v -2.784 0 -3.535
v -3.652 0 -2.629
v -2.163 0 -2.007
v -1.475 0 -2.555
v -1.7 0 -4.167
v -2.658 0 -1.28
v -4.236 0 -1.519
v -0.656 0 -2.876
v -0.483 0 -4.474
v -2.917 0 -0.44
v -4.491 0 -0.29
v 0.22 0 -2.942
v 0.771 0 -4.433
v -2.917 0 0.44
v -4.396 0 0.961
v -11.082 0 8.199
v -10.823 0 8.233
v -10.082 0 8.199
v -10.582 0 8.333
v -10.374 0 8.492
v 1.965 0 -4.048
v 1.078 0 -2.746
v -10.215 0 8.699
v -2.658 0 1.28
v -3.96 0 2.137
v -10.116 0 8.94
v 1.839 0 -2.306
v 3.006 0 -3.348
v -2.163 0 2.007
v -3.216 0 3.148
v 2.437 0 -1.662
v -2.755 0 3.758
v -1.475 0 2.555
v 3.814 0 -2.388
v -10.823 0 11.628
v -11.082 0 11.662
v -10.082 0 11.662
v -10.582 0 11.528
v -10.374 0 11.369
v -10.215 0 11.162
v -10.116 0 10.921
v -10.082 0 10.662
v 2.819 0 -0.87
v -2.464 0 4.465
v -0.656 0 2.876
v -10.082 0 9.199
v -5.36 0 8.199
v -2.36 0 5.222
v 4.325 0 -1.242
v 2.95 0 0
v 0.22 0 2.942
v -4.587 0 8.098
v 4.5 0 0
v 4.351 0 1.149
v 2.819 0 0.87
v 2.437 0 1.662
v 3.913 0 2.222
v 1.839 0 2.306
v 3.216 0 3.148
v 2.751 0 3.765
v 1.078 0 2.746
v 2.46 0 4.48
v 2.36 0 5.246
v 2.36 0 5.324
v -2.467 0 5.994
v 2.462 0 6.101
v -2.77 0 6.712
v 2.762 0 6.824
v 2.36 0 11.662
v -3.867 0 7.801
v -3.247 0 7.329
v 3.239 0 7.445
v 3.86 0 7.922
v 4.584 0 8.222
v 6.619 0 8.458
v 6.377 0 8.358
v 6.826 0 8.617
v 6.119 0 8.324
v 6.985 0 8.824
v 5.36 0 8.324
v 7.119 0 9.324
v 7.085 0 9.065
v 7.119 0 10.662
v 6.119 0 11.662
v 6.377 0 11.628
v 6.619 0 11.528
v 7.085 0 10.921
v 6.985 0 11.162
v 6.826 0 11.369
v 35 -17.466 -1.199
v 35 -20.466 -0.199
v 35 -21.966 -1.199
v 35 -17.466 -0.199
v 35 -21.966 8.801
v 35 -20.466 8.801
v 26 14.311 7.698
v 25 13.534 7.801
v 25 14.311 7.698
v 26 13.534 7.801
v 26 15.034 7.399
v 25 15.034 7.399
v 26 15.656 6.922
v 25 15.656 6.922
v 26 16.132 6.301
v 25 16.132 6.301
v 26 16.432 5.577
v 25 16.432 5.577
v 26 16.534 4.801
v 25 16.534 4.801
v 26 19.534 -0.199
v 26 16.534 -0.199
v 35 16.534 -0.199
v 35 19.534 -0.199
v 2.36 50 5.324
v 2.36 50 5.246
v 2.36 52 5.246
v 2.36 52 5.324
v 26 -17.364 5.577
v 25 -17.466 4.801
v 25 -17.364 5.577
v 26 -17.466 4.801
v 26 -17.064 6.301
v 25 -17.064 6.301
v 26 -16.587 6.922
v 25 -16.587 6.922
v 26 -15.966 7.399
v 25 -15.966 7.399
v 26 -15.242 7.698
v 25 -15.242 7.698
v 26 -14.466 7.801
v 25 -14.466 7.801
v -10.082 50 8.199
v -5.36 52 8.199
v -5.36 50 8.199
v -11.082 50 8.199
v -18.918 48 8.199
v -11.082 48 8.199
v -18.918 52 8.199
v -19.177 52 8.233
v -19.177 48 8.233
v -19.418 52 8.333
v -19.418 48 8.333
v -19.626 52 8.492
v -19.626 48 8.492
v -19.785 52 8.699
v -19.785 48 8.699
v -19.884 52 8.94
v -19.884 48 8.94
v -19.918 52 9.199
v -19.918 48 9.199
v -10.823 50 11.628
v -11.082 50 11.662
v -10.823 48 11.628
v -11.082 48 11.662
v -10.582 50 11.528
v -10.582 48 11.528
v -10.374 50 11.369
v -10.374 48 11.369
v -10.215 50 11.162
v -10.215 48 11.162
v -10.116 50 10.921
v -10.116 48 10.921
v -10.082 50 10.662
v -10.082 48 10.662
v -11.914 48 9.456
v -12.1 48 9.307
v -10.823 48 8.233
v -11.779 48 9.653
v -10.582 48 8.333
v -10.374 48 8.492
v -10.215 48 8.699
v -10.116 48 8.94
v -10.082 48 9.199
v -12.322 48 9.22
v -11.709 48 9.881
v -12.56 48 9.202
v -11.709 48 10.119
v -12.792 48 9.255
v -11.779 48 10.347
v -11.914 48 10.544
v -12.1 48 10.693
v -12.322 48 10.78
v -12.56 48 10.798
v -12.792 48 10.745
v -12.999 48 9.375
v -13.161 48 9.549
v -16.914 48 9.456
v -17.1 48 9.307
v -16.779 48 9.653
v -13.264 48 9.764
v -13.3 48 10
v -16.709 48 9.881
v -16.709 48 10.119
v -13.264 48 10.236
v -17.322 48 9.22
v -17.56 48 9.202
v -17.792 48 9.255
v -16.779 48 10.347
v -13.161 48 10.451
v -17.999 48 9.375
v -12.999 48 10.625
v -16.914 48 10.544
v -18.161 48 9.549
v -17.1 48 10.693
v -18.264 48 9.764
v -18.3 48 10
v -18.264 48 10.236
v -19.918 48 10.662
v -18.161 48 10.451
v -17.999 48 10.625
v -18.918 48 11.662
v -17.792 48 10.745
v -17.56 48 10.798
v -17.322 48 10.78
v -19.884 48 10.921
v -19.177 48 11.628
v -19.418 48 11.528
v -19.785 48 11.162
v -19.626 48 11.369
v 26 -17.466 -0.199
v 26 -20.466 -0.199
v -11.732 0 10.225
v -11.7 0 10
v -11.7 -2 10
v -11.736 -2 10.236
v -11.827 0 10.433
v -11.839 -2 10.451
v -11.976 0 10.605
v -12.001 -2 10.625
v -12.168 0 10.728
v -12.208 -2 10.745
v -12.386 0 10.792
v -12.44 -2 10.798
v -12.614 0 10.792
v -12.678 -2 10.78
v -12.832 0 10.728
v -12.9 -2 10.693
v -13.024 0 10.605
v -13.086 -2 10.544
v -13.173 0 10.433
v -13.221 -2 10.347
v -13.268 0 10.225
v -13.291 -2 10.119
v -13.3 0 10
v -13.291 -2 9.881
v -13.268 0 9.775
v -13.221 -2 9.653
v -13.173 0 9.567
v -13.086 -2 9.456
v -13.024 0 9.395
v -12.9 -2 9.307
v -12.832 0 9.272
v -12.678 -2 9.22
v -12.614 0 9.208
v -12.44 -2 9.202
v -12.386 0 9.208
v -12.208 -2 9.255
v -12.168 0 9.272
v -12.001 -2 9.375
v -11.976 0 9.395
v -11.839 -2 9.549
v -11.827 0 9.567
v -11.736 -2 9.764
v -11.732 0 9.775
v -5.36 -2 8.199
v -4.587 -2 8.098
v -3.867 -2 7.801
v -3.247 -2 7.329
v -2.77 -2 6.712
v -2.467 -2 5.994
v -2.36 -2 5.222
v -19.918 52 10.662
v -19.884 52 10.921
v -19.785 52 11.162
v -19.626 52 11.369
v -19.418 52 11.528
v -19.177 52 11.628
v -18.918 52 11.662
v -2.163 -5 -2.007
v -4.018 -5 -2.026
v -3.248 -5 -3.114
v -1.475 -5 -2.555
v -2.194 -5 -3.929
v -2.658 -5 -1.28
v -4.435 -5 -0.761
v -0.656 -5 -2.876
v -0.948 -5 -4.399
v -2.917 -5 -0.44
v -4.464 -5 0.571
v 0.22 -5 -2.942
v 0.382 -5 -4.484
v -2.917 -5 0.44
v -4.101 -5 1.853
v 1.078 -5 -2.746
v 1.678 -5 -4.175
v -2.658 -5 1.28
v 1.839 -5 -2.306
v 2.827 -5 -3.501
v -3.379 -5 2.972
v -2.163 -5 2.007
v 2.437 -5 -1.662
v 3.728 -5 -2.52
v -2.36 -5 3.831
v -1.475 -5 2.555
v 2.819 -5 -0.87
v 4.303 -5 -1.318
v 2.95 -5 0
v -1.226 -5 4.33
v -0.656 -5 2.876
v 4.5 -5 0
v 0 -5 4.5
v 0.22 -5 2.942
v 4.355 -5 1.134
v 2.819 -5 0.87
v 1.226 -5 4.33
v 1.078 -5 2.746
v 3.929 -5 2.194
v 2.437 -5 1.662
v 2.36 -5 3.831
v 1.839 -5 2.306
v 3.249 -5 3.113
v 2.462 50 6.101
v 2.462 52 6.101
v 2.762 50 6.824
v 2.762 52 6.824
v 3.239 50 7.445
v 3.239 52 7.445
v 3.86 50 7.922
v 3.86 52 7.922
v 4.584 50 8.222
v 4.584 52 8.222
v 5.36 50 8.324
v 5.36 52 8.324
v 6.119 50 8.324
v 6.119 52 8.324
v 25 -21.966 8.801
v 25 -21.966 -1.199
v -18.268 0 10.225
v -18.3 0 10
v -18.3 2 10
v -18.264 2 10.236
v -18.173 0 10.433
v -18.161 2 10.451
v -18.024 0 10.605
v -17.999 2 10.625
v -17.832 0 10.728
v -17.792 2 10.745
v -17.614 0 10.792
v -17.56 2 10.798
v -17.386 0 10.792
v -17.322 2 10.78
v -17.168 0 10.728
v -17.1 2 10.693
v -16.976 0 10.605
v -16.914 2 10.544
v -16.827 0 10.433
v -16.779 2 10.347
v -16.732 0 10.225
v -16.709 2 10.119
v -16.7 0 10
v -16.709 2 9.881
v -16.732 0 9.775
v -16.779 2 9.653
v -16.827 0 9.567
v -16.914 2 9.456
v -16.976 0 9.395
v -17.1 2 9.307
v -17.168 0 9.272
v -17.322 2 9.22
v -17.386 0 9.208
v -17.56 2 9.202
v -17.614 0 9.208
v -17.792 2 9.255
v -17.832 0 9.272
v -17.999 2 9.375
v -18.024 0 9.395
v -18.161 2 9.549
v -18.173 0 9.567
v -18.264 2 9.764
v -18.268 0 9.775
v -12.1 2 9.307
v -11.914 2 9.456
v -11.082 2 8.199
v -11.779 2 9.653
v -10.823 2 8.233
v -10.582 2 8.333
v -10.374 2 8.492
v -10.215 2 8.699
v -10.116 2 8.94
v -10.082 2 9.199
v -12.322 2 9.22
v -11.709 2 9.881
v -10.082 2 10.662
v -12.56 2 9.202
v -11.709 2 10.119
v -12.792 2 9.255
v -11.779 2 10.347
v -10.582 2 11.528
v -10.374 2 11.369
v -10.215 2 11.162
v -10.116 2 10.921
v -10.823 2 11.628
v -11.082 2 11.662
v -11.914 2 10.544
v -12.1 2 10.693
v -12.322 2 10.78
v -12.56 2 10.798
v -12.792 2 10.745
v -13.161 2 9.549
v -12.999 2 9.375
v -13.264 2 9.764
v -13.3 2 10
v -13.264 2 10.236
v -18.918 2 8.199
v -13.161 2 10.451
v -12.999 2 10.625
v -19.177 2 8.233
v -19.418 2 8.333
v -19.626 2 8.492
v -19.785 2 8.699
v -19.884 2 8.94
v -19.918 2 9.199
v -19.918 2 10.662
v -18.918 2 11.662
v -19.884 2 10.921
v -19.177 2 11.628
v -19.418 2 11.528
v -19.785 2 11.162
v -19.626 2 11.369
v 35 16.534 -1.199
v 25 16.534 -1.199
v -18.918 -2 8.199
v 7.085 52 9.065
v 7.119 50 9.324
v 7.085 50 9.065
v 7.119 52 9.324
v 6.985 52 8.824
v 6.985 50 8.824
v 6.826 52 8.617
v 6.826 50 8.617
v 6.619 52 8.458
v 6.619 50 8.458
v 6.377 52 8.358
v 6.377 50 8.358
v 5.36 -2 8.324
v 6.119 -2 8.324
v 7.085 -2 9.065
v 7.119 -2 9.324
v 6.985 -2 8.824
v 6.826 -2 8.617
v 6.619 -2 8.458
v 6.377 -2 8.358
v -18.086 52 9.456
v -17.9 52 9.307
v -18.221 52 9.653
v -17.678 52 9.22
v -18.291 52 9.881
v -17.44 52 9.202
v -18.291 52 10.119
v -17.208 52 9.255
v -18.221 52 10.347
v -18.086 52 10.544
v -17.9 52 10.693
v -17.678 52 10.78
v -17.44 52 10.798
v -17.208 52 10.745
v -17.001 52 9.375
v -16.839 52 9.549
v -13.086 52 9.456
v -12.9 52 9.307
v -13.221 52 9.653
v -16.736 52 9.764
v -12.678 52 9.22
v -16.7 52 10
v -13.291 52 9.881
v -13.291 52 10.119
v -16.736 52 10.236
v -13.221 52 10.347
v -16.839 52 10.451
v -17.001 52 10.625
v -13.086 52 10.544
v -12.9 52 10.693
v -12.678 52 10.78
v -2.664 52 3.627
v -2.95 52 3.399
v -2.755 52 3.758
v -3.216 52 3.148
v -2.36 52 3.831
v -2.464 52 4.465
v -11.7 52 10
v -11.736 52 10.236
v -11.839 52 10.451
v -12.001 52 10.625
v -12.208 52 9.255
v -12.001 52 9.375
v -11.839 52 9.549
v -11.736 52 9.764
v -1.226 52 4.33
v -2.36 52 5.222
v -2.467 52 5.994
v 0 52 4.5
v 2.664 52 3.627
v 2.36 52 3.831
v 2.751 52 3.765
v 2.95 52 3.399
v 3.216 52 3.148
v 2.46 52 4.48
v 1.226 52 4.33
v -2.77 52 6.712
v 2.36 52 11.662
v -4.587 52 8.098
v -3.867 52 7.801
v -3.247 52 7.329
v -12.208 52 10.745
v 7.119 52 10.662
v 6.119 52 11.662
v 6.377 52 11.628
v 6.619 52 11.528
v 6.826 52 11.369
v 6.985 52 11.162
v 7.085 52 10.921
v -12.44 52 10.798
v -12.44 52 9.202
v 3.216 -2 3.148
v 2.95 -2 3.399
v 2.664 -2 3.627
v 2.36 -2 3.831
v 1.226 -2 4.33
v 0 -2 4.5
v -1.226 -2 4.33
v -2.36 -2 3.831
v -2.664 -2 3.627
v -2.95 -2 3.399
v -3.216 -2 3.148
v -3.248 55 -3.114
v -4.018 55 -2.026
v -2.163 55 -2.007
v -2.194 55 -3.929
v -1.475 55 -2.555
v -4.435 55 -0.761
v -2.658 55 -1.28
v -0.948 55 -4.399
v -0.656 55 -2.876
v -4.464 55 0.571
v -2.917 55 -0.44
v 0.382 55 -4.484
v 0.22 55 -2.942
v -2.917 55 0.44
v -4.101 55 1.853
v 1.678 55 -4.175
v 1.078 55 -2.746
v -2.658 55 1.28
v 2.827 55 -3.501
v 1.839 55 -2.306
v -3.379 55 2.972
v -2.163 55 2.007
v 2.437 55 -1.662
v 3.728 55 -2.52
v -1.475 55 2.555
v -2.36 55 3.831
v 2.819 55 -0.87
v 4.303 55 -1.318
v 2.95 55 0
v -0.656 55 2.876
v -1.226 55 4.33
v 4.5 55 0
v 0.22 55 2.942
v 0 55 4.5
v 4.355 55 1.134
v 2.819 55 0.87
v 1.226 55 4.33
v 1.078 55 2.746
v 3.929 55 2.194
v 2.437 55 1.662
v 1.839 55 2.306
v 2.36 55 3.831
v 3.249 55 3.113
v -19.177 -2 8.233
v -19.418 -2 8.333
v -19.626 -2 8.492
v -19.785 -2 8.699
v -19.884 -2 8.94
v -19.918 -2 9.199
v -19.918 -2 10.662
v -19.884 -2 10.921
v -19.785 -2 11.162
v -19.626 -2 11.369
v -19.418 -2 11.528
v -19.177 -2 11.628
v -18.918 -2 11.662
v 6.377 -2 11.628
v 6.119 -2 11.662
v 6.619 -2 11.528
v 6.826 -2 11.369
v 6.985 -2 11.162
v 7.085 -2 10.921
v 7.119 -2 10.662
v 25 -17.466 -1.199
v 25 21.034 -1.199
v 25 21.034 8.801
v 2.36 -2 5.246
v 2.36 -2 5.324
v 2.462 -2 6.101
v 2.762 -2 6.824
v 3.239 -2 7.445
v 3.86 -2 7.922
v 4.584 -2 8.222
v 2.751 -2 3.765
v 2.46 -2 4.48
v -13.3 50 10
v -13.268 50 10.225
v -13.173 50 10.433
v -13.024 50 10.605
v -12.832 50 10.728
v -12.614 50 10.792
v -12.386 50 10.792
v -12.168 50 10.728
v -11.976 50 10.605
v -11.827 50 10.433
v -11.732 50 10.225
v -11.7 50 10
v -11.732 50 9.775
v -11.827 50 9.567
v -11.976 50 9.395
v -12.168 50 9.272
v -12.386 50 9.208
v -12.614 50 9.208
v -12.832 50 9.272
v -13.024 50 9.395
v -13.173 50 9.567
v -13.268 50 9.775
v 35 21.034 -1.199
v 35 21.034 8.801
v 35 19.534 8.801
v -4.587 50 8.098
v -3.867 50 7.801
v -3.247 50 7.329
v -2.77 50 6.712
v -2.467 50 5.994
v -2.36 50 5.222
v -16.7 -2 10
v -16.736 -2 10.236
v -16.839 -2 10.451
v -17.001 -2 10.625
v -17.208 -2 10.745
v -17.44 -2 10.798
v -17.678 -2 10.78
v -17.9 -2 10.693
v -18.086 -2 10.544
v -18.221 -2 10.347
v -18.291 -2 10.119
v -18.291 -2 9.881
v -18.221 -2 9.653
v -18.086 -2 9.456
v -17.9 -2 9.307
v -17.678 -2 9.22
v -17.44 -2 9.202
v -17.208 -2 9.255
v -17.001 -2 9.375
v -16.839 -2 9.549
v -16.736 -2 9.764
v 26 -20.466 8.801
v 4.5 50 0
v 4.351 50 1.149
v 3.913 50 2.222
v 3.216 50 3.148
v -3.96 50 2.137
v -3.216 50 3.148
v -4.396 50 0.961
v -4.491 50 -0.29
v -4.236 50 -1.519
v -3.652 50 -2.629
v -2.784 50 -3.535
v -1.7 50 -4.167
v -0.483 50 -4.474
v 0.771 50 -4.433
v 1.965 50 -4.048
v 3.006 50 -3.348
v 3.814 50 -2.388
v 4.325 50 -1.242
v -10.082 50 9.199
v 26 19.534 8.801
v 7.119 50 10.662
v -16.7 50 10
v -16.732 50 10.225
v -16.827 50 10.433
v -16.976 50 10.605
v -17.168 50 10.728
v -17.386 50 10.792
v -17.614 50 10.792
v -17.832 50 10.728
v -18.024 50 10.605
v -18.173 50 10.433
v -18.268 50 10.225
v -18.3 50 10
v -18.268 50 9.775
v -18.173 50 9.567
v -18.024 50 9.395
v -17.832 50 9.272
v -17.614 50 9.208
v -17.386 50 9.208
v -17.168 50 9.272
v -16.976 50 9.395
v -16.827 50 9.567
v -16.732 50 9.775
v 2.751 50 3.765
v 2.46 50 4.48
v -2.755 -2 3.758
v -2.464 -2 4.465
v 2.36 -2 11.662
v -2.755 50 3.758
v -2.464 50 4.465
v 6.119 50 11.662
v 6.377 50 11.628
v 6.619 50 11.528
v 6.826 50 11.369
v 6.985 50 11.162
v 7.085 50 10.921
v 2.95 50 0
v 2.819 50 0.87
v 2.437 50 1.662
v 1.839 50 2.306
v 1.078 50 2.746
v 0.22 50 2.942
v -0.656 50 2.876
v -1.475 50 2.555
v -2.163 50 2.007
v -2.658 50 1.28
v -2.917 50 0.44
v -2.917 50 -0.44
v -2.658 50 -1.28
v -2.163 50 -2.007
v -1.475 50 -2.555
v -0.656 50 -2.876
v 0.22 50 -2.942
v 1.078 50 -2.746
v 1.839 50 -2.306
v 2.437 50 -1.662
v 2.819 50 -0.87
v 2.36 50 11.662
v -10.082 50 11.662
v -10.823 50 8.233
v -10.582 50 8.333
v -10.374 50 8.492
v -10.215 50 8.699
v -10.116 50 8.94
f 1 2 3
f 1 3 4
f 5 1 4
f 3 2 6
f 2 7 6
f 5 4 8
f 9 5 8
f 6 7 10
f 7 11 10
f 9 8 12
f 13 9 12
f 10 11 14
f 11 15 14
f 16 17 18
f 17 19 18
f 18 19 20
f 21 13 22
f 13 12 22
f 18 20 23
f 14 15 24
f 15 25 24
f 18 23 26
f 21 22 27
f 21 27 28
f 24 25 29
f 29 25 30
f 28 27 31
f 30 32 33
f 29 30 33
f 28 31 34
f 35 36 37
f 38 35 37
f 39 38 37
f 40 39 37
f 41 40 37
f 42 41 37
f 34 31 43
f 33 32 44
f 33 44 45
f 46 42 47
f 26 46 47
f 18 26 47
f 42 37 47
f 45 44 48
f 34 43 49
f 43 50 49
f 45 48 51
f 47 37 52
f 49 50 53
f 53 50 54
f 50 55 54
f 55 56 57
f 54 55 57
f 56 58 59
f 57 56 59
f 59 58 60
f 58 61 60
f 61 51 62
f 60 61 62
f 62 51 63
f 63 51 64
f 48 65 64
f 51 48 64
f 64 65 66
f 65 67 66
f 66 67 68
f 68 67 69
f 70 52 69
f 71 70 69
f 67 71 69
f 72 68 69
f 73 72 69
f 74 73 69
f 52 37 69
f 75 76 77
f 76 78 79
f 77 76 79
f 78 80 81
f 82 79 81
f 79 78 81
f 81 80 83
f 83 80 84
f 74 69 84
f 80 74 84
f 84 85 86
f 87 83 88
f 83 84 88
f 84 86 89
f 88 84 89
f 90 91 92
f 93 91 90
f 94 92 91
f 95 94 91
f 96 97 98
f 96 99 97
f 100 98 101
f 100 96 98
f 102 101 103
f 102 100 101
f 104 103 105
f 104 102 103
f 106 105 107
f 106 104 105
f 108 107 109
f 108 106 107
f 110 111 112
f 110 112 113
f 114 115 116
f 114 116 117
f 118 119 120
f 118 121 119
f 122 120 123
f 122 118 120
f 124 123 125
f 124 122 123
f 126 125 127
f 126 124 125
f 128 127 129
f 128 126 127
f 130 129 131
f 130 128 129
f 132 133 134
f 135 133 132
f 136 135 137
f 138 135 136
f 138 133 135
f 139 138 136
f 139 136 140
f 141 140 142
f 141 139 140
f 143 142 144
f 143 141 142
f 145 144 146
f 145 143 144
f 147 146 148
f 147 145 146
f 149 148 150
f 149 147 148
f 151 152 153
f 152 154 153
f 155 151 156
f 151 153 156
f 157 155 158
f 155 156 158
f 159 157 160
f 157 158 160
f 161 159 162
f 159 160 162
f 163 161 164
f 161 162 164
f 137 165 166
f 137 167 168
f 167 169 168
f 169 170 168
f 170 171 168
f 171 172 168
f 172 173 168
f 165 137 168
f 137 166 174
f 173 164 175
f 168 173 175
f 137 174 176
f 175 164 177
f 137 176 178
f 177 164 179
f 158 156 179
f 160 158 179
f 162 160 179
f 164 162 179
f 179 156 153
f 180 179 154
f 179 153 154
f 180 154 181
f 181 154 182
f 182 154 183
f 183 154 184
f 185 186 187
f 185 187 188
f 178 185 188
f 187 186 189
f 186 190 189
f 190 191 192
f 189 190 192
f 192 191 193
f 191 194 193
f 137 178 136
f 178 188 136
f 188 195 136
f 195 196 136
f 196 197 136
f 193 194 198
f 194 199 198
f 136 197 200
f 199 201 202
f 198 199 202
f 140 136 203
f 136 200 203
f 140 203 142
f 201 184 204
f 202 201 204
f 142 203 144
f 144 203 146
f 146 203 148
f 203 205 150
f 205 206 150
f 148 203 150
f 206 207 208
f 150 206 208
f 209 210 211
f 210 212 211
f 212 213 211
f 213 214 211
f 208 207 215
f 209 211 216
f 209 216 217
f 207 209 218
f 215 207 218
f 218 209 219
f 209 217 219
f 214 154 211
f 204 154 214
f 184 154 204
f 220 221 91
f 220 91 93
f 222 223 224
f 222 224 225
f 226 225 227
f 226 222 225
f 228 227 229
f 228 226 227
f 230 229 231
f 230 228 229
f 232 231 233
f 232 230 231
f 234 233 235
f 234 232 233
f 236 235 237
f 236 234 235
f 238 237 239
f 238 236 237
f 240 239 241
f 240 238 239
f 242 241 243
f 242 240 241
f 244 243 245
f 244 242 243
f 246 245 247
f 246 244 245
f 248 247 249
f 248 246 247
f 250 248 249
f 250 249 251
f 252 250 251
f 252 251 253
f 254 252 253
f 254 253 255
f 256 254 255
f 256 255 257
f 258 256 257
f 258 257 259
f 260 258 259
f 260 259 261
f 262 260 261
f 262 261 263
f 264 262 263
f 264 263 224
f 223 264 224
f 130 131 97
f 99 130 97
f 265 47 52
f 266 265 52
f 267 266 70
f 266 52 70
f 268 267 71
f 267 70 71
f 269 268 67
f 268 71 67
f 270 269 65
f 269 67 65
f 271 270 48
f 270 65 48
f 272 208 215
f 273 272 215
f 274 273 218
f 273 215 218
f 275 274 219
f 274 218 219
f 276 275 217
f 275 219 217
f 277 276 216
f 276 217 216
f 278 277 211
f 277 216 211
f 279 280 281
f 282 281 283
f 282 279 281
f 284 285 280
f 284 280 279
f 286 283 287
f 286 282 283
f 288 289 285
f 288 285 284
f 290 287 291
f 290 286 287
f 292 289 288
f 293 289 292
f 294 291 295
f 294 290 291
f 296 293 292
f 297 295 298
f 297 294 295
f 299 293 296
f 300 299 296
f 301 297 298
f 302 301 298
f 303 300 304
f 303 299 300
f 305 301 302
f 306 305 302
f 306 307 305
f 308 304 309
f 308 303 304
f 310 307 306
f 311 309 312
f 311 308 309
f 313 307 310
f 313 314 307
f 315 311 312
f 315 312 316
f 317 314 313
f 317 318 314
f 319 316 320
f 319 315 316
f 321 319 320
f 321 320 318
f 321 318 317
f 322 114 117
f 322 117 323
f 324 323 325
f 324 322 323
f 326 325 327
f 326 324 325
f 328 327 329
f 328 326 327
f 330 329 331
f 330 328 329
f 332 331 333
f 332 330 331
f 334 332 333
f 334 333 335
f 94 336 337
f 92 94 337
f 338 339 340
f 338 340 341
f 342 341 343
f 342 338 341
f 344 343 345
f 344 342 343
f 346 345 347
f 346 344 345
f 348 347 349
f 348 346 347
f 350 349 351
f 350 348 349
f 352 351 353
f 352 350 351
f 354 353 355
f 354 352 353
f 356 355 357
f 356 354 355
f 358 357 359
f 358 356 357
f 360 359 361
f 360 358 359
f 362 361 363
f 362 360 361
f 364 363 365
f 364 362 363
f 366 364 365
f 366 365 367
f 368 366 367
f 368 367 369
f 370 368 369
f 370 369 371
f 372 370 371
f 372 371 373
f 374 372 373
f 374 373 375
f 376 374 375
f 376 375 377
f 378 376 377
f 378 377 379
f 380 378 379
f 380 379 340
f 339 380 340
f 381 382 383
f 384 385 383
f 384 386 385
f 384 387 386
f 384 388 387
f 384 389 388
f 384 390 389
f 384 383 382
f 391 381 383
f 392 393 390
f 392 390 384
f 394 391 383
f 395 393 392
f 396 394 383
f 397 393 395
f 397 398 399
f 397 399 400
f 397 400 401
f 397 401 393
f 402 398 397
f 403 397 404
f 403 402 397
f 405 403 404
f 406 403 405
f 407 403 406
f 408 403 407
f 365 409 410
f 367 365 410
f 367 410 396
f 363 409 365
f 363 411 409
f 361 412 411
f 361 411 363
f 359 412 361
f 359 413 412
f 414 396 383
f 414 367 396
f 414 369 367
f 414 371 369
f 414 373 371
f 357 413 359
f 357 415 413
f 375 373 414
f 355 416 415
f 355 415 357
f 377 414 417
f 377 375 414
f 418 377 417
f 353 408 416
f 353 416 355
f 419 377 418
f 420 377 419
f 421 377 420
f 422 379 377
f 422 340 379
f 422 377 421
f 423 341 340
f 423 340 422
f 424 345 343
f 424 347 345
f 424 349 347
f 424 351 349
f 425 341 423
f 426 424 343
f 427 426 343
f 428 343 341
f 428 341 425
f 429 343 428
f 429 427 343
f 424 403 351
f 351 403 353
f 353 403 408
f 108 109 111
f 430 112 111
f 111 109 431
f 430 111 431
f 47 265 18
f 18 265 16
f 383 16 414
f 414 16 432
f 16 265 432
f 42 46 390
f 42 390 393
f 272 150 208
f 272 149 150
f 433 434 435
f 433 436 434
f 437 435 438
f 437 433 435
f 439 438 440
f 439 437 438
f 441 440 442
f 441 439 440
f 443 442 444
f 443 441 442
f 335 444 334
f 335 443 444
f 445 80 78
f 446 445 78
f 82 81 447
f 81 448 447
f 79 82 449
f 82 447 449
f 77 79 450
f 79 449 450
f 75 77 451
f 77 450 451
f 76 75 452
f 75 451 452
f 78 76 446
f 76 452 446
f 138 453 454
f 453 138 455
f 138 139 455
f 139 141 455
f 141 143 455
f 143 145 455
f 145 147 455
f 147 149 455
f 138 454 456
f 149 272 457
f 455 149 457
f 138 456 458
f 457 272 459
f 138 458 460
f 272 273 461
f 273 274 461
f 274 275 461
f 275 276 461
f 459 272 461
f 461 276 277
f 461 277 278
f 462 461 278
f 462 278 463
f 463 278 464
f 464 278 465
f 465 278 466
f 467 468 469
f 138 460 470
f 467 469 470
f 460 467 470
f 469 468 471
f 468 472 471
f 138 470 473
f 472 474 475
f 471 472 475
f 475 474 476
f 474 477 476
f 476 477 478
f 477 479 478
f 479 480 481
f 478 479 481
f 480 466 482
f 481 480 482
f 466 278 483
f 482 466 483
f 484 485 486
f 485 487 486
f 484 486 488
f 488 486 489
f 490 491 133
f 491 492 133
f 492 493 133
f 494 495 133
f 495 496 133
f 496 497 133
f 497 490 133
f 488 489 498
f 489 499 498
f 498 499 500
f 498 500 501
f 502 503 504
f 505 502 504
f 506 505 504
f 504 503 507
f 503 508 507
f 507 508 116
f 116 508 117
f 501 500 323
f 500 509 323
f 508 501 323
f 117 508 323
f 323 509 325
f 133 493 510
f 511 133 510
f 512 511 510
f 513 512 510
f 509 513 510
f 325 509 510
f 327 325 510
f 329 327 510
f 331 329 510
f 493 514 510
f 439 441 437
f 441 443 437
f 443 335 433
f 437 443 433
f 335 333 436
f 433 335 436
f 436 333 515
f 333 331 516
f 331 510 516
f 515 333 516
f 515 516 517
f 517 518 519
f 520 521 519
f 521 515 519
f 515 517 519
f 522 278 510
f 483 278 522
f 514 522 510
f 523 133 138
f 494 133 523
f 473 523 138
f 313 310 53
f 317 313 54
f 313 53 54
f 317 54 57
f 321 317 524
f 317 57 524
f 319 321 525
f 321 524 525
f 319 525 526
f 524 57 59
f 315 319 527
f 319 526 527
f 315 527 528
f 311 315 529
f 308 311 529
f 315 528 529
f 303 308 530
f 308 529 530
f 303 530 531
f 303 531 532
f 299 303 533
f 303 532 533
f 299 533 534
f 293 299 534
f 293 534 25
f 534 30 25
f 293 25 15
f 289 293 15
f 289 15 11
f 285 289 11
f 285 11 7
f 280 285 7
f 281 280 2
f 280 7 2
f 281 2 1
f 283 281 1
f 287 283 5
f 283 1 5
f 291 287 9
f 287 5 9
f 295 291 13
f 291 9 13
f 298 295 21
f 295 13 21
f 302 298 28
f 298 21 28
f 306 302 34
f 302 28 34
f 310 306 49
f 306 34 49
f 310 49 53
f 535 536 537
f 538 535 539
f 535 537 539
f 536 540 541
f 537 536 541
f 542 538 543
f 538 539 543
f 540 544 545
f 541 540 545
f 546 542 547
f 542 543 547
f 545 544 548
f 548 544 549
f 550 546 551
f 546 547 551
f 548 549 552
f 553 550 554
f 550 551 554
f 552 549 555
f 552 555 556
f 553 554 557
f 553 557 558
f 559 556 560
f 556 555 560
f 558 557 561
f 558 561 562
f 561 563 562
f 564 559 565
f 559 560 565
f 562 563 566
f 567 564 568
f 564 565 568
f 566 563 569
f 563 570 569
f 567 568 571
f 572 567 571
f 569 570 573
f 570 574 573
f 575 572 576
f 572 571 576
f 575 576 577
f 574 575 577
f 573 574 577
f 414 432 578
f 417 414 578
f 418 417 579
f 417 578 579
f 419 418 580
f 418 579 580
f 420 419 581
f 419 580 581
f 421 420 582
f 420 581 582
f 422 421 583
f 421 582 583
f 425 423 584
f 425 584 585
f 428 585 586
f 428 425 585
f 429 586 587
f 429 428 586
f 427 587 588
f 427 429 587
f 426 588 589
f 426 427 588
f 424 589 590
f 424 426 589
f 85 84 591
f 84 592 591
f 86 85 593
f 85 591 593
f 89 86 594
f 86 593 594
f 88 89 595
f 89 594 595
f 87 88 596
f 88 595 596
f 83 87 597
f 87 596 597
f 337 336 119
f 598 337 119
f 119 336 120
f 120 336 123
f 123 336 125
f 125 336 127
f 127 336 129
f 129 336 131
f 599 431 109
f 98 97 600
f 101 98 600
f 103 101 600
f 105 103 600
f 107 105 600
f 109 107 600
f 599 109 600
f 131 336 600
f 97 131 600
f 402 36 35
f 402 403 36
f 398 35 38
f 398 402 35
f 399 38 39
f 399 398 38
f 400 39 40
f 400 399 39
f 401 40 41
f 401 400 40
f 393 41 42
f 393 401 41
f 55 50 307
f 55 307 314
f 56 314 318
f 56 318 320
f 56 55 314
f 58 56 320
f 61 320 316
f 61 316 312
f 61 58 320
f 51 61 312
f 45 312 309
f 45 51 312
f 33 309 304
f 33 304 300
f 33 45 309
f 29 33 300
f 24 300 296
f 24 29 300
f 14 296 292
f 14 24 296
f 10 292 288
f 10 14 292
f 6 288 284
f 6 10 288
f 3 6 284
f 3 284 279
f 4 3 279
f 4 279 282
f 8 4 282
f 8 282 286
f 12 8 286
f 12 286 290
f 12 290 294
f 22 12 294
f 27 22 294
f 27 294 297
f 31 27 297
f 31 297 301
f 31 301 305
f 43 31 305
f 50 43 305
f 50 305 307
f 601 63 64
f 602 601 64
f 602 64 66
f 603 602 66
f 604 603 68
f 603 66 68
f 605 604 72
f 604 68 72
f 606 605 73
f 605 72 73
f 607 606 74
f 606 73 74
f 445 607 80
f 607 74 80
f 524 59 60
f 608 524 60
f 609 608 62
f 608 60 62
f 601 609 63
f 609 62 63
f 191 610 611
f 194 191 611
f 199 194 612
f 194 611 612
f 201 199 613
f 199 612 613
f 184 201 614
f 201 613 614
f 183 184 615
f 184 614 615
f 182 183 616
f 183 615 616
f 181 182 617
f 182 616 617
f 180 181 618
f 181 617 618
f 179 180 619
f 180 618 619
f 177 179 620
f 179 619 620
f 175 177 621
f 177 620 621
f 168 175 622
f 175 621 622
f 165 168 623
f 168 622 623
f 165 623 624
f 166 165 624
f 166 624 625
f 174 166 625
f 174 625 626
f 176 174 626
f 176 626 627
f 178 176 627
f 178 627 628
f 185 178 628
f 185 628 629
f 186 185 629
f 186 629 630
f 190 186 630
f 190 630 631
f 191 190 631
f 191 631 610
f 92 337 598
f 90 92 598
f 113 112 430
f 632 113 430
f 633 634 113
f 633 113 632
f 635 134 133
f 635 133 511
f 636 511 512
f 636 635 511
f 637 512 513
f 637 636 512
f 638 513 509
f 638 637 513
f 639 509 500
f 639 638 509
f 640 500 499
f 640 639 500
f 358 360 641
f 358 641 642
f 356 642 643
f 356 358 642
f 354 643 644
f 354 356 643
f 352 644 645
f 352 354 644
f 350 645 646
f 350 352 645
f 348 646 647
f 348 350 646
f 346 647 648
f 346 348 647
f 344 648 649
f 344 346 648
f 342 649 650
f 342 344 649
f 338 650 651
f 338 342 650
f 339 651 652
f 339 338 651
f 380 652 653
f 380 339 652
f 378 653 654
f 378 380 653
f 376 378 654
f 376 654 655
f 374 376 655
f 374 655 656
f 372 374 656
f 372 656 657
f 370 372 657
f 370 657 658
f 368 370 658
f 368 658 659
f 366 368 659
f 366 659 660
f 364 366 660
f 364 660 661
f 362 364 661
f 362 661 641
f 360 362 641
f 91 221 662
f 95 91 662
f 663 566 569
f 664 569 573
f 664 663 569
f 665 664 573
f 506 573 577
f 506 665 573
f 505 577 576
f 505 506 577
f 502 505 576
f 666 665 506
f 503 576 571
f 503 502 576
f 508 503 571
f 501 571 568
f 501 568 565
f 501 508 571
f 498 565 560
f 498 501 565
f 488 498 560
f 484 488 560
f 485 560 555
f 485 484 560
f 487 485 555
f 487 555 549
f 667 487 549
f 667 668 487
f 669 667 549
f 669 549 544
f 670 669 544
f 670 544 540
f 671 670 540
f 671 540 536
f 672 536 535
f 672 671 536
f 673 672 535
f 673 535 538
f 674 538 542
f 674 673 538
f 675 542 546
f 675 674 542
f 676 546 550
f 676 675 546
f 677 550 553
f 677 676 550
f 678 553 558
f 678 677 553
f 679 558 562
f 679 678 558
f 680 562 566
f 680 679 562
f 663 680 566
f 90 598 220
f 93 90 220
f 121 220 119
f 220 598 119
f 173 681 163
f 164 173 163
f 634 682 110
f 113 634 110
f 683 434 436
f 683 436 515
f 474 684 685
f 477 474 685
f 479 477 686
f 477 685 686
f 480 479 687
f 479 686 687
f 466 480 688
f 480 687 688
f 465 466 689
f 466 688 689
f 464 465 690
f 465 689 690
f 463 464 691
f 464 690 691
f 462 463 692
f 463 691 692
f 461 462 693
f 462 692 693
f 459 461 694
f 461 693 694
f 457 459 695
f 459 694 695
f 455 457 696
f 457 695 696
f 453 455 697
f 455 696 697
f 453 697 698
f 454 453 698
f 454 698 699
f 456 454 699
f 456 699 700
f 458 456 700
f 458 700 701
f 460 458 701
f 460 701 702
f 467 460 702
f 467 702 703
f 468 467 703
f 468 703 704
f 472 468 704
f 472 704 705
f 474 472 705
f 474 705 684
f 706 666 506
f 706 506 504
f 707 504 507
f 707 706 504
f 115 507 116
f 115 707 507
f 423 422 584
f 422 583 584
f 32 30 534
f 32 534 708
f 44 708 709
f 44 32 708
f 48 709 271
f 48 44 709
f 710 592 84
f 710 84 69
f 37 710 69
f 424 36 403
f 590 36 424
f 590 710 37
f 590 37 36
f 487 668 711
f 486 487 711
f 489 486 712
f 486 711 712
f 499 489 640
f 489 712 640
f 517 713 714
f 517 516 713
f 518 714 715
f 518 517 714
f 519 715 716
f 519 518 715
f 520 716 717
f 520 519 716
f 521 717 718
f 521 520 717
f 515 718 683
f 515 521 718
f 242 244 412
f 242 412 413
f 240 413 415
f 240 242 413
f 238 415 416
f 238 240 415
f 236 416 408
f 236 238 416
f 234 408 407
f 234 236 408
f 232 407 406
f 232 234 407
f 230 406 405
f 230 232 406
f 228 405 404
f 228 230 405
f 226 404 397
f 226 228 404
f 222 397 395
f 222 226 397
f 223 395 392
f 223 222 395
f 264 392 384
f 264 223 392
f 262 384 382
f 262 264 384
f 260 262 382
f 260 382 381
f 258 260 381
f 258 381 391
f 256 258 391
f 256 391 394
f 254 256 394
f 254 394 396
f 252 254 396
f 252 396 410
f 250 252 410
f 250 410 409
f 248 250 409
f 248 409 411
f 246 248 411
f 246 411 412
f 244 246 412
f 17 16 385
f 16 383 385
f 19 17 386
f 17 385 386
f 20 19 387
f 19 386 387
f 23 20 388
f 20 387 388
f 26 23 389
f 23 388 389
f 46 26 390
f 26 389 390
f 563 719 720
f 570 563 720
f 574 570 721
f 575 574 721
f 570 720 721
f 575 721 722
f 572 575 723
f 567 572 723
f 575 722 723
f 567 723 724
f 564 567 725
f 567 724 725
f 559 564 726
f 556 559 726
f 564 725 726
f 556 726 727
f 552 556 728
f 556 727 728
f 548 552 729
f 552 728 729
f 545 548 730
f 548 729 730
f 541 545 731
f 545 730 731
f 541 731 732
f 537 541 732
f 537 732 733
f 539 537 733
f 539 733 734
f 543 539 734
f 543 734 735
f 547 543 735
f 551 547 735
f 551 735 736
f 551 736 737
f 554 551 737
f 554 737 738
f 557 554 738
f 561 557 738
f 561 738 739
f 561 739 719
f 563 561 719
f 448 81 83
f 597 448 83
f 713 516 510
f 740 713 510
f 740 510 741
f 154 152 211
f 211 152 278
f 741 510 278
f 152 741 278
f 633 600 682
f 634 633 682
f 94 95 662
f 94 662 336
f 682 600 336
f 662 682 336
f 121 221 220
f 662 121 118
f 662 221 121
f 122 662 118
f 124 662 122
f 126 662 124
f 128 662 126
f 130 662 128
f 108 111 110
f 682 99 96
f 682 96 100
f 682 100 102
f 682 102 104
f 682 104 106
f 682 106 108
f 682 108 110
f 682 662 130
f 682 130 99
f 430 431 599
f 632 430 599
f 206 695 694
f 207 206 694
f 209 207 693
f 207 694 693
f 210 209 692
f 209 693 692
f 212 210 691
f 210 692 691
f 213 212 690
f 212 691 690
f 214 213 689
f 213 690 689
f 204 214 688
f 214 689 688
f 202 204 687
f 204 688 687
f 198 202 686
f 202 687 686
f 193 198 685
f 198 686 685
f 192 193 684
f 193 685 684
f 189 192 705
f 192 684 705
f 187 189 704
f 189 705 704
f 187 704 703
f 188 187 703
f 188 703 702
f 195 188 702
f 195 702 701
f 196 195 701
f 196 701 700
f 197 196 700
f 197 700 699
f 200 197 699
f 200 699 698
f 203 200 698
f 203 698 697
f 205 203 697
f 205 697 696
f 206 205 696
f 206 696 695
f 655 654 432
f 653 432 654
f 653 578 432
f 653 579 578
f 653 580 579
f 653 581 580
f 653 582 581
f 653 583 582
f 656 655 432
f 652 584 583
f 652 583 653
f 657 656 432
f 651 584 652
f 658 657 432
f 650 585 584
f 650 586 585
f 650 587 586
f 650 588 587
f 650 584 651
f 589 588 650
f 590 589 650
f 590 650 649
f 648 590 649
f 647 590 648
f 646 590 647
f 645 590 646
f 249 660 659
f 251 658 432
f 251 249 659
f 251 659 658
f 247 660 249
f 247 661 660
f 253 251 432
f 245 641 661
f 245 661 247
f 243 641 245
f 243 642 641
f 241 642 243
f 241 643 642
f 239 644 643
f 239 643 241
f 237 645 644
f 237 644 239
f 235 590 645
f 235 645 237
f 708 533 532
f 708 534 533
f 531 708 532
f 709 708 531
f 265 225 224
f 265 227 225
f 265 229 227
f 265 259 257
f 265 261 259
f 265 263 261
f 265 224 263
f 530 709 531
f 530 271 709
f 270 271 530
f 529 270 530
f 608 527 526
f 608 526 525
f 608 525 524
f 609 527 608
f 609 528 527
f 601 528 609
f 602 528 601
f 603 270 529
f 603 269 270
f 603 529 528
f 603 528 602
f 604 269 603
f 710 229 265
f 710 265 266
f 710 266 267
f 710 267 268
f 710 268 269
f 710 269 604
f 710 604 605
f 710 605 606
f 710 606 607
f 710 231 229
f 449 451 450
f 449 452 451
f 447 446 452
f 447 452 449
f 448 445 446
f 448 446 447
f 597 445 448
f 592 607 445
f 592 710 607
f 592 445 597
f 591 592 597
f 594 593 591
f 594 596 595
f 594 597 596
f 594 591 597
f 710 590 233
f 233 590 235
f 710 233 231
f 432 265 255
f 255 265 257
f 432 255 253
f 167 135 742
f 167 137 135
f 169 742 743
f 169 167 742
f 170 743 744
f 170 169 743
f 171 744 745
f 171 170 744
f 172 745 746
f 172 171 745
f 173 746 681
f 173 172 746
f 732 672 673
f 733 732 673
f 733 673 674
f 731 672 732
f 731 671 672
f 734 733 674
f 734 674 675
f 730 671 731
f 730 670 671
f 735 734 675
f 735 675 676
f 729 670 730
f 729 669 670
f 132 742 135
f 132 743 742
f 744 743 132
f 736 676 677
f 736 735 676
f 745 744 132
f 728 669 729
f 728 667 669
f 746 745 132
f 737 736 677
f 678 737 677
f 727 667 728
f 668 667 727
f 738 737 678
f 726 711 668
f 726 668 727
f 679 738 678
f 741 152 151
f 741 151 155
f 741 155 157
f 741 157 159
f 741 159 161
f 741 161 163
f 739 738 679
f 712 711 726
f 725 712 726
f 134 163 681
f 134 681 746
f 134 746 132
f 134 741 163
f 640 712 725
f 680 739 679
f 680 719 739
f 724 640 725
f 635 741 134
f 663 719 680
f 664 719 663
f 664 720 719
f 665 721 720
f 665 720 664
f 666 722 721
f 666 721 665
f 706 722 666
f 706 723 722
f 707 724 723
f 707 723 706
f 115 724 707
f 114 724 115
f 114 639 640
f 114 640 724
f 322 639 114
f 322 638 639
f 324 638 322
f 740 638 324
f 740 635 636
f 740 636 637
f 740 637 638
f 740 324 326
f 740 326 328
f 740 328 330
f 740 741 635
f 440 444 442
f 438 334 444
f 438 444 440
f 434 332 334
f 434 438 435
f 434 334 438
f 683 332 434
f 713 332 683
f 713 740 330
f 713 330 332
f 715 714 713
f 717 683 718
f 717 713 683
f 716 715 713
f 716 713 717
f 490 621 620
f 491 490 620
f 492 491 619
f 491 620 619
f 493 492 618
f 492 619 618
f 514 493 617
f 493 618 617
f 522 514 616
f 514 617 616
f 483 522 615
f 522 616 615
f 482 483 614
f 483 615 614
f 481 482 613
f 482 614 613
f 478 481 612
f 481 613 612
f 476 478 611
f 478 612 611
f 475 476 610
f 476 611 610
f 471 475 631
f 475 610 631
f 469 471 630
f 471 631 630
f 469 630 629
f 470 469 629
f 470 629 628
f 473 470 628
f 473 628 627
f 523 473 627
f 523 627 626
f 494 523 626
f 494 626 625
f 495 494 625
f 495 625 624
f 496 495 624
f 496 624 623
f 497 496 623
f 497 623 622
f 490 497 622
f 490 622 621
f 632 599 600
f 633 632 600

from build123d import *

# Parameters (mm, degrees)
F0_R        = 2.95
F0_R_2      = 0.8
F0_W        = 4.7585960214
F0_H        = 3.3378887317
F1_DEPTH    = 2
F2_W        = 9.8369888743
F2_H        = 3.4630449291
F2_R        = 0.8
F3_DEPTH    = 2
F4_DEPTH    = 5
F5_T1_DEPTH = 2
F6_R        = 1
F10_W       = 3
F10_H       = 8
F10_H_2     = 1
F11_DEPTH   = 1
F12_DEPTH   = 10
F13_R       = 3


# Not quite as in the source:
# - a fillet or chamfer that OpenCascade refuses, or shapes differently, is made with other operations: its cross-section is extruded or revolved along the edge and cut away or added


with BuildPart() as f1:
    # F0 (on Front) → F1 (new body)
    with BuildSketch(Plane.XZ):
        with BuildLine():
            ThreePointArc((-2.3600532936, 3.8314681848), (-2.1942835025, -3.9287555168), (4.5, 0))
            ThreePointArc((4.5, 0), (3.9287555168, 2.1942835025), (2.3600532936, 3.8314681848))
            ThreePointArc((2.3600532936, 3.8314681848), (0, 4.5), (-2.3600532936, 3.8314681848))
        make_face()
        Circle(F0_R, mode=Mode.SUBTRACT)
        with BuildLine():
            ThreePointArc((-2.3600532936, 3.8314681848), (0, 4.5), (2.3600532936, 3.8314681848))
            Line((2.3600532936, 3.8314681848), (2.3600532936, 6.6316658631))
            Line((2.3600532936, 6.6316658631), (-2.3600532936, 6.6316658631))
            Line((-2.3600532936, 6.6316658631), (-2.3600532936, 3.8314681848))
        make_face()
        Polygon((-2.3600532936, 6.6316658631), (2.3600532936, 6.6316658631), (2.3600532936, 8.3240726963), (2.3600532936, 11.6619614279), (-19.9184944371, 11.6619614279), (-19.9184944371, 8.1989164988), (-2.3600532936, 8.1989164988), align=None)
        with Locations((-17.5, 10)):
            Circle(F0_R_2, mode=Mode.SUBTRACT)
        with Locations((-12.5, 10)):
            Circle(F0_R_2, mode=Mode.SUBTRACT)
        with Locations((4.7393513044, 9.9930170621)):
            Rectangle(F0_W, F0_H)
    extrude(amount=F1_DEPTH)

    # F2 (on face) → F3 (join)
    with BuildSketch(Plane(origin=(0, 0, 0), x_dir=(-1, 0, 0), z_dir=(0, 1, 0))):
        with Locations((15, 9.9304389634)):
            Rectangle(F2_W, F2_H)
        with Locations((12.5, 10)):
            Circle(F2_R, mode=Mode.SUBTRACT)
        with Locations((17.5, 10)):
            Circle(F2_R, mode=Mode.SUBTRACT)
    extrude(amount=F3_DEPTH)

    # F0 (on Front) → F4 (join)
    with BuildSketch(Plane.XZ):
        with BuildLine():
            ThreePointArc((-2.3600532936, 3.8314681848), (-2.1942835025, -3.9287555168), (4.5, 0))
            ThreePointArc((4.5, 0), (3.9287555168, 2.1942835025), (2.3600532936, 3.8314681848))
            ThreePointArc((2.3600532936, 3.8314681848), (0, 4.5), (-2.3600532936, 3.8314681848))
        make_face()
        Circle(F0_R, mode=Mode.SUBTRACT)
    extrude(amount=F4_DEPTH)

    # F5: fillet of radius 3 on 4 edges, made by hand

    # F5_s2 → F5_t1 (join)
    with BuildSketch(Plane.XZ):
        with BuildLine():
            ThreePointArc((3.2160319762, 3.1475606949), (2.582278649, 4.1128113633), (2.3600532936, 5.2459344915))
            Line((2.3600532936, 5.2459344915), (2.3600532936, 3.8314681848))
            ThreePointArc((2.3600532936, 3.8314681848), (2.8089346909, 3.5156629392), (3.2160319762, 3.1475606949))
        make_face()
        with BuildLine():
            ThreePointArc((-5.3600532936, 8.1989164988), (-3.2387329501, 7.3202368424), (-2.3600532936, 5.1989164988))
            Line((-2.3600532936, 5.1989164988), (-2.3600532936, 8.1989164988))
            Line((-2.3600532936, 8.1989164988), (-5.3600532936, 8.1989164988))
        make_face()
        with BuildLine():
            ThreePointArc((-3.2160319762, 3.1475606949), (-2.582278649, 4.1128113633), (-2.3600532936, 5.2459344915))
            Line((-2.3600532936, 5.2459344915), (-2.3600532936, 3.8314681848))
            ThreePointArc((-2.3600532936, 3.8314681848), (-2.8089346909, 3.5156629392), (-3.2160319762, 3.1475606949))
        make_face()
        with BuildLine():
            ThreePointArc((2.3600532936, 5.3240726963), (3.2387329501, 7.4453930398), (5.3600532936, 8.3240726963))
            Line((5.3600532936, 8.3240726963), (2.3600532936, 8.3240726963))
            Line((2.3600532936, 8.3240726963), (2.3600532936, 5.3240726963))
        make_face()
    extrude(amount=F5_T1_DEPTH)

    # F6
    f6_edges = [f1.edges().sort_by_distance(p)[0] for p in [
        (-19.918494, 0, 11.661961),
        (-10.081506, 1, 11.661961),
        (-19.918494, 0, 8.198916),
        (-10.081506, 1, 8.198916),
        (7.118649, -1, 8.324073),
        (7.118649, -1, 11.661961),
    ]]
    fillet(f6_edges, radius=F6_R)


with BuildPart() as f8_1:
    # F8: instance of F1
    add(f1.part.mirror(Plane.XZ.offset(-25)))


with BuildPart() as f11:
    # F10 (on offset) → F11 (new body)
    with BuildSketch(Plane.YZ.offset(25)):
        Polygon((-20.4657563084, 8.8006782488), (-21.9657563084, 8.8006782488), (-21.9657563084, -1.1993217512), (-20.4657563084, -1.1993217512), (-20.4657563084, -0.1993217512), (-20.4657563084, 7.8006782488), align=None)
        Polygon((19.5342436916, 8.8006782488), (-20.4657563084, 8.8006782488), (-20.4657563084, 7.8006782488), (-17.4657563084, 7.8006782488), (16.5342436916, 7.8006782488), (19.5342436916, 7.8006782488), align=None)
        with Locations((-18.9657563084, 3.8006782488)):
            Rectangle(F10_W, F10_H)
        Polygon((21.0342436916, 8.8006782488), (19.5342436916, 8.8006782488), (19.5342436916, 7.8006782488), (19.5342436916, -0.1993217512), (19.5342436916, -1.1993217512), (21.0342436916, -1.1993217512), align=None)
        with Locations((-18.9657563084, -0.6993217512)):
            Rectangle(F10_W, F10_H_2)
        with Locations((18.0342436916, 3.8006782488)):
            Rectangle(F10_W, F10_H)
        with Locations((18.0342436916, -0.6993217512)):
            Rectangle(F10_W, F10_H_2)
    extrude(amount=F11_DEPTH)

    # F10 (on offset) → F12 (join)
    with BuildSketch(Plane.YZ.offset(25)):
        with Locations((18.0342436916, -0.6993217512)):
            Rectangle(F10_W, F10_H_2)
        with Locations((-18.9657563084, -0.6993217512)):
            Rectangle(F10_W, F10_H_2)
        Polygon((21.0342436916, 8.8006782488), (19.5342436916, 8.8006782488), (19.5342436916, 7.8006782488), (19.5342436916, -0.1993217512), (19.5342436916, -1.1993217512), (21.0342436916, -1.1993217512), align=None)
        Polygon((-20.4657563084, 8.8006782488), (-21.9657563084, 8.8006782488), (-21.9657563084, -1.1993217512), (-20.4657563084, -1.1993217512), (-20.4657563084, -0.1993217512), (-20.4657563084, 7.8006782488), align=None)
    extrude(amount=F12_DEPTH)

    # F13
    f13_edges = [f11.edges().sort_by_distance(p)[0] for p in [
        (25.5, 16.534244, 7.800678),
        (25.5, -17.465756, 7.800678),
    ]]
    fillet(f13_edges, radius=F13_R)


solid = Compound([f1.part, f8_1.part, f11.part])
